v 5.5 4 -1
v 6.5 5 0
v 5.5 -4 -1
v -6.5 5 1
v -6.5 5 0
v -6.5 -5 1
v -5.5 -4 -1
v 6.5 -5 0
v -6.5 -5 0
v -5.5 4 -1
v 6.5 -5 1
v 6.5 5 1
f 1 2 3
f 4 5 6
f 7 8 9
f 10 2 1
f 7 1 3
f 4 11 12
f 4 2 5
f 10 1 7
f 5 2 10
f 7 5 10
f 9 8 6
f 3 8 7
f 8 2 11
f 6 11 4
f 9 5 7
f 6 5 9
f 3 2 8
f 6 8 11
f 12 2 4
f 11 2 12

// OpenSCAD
$fa = 2;
$fs = 0.4;

module receiver() {
  color("#1e4a1e")
    hull() {
      cube([11, 8, 2], center = true);
      translate([0, 0, 0.5])
        cube([13, 10, 1], center = true);
    }
}

receiver();
